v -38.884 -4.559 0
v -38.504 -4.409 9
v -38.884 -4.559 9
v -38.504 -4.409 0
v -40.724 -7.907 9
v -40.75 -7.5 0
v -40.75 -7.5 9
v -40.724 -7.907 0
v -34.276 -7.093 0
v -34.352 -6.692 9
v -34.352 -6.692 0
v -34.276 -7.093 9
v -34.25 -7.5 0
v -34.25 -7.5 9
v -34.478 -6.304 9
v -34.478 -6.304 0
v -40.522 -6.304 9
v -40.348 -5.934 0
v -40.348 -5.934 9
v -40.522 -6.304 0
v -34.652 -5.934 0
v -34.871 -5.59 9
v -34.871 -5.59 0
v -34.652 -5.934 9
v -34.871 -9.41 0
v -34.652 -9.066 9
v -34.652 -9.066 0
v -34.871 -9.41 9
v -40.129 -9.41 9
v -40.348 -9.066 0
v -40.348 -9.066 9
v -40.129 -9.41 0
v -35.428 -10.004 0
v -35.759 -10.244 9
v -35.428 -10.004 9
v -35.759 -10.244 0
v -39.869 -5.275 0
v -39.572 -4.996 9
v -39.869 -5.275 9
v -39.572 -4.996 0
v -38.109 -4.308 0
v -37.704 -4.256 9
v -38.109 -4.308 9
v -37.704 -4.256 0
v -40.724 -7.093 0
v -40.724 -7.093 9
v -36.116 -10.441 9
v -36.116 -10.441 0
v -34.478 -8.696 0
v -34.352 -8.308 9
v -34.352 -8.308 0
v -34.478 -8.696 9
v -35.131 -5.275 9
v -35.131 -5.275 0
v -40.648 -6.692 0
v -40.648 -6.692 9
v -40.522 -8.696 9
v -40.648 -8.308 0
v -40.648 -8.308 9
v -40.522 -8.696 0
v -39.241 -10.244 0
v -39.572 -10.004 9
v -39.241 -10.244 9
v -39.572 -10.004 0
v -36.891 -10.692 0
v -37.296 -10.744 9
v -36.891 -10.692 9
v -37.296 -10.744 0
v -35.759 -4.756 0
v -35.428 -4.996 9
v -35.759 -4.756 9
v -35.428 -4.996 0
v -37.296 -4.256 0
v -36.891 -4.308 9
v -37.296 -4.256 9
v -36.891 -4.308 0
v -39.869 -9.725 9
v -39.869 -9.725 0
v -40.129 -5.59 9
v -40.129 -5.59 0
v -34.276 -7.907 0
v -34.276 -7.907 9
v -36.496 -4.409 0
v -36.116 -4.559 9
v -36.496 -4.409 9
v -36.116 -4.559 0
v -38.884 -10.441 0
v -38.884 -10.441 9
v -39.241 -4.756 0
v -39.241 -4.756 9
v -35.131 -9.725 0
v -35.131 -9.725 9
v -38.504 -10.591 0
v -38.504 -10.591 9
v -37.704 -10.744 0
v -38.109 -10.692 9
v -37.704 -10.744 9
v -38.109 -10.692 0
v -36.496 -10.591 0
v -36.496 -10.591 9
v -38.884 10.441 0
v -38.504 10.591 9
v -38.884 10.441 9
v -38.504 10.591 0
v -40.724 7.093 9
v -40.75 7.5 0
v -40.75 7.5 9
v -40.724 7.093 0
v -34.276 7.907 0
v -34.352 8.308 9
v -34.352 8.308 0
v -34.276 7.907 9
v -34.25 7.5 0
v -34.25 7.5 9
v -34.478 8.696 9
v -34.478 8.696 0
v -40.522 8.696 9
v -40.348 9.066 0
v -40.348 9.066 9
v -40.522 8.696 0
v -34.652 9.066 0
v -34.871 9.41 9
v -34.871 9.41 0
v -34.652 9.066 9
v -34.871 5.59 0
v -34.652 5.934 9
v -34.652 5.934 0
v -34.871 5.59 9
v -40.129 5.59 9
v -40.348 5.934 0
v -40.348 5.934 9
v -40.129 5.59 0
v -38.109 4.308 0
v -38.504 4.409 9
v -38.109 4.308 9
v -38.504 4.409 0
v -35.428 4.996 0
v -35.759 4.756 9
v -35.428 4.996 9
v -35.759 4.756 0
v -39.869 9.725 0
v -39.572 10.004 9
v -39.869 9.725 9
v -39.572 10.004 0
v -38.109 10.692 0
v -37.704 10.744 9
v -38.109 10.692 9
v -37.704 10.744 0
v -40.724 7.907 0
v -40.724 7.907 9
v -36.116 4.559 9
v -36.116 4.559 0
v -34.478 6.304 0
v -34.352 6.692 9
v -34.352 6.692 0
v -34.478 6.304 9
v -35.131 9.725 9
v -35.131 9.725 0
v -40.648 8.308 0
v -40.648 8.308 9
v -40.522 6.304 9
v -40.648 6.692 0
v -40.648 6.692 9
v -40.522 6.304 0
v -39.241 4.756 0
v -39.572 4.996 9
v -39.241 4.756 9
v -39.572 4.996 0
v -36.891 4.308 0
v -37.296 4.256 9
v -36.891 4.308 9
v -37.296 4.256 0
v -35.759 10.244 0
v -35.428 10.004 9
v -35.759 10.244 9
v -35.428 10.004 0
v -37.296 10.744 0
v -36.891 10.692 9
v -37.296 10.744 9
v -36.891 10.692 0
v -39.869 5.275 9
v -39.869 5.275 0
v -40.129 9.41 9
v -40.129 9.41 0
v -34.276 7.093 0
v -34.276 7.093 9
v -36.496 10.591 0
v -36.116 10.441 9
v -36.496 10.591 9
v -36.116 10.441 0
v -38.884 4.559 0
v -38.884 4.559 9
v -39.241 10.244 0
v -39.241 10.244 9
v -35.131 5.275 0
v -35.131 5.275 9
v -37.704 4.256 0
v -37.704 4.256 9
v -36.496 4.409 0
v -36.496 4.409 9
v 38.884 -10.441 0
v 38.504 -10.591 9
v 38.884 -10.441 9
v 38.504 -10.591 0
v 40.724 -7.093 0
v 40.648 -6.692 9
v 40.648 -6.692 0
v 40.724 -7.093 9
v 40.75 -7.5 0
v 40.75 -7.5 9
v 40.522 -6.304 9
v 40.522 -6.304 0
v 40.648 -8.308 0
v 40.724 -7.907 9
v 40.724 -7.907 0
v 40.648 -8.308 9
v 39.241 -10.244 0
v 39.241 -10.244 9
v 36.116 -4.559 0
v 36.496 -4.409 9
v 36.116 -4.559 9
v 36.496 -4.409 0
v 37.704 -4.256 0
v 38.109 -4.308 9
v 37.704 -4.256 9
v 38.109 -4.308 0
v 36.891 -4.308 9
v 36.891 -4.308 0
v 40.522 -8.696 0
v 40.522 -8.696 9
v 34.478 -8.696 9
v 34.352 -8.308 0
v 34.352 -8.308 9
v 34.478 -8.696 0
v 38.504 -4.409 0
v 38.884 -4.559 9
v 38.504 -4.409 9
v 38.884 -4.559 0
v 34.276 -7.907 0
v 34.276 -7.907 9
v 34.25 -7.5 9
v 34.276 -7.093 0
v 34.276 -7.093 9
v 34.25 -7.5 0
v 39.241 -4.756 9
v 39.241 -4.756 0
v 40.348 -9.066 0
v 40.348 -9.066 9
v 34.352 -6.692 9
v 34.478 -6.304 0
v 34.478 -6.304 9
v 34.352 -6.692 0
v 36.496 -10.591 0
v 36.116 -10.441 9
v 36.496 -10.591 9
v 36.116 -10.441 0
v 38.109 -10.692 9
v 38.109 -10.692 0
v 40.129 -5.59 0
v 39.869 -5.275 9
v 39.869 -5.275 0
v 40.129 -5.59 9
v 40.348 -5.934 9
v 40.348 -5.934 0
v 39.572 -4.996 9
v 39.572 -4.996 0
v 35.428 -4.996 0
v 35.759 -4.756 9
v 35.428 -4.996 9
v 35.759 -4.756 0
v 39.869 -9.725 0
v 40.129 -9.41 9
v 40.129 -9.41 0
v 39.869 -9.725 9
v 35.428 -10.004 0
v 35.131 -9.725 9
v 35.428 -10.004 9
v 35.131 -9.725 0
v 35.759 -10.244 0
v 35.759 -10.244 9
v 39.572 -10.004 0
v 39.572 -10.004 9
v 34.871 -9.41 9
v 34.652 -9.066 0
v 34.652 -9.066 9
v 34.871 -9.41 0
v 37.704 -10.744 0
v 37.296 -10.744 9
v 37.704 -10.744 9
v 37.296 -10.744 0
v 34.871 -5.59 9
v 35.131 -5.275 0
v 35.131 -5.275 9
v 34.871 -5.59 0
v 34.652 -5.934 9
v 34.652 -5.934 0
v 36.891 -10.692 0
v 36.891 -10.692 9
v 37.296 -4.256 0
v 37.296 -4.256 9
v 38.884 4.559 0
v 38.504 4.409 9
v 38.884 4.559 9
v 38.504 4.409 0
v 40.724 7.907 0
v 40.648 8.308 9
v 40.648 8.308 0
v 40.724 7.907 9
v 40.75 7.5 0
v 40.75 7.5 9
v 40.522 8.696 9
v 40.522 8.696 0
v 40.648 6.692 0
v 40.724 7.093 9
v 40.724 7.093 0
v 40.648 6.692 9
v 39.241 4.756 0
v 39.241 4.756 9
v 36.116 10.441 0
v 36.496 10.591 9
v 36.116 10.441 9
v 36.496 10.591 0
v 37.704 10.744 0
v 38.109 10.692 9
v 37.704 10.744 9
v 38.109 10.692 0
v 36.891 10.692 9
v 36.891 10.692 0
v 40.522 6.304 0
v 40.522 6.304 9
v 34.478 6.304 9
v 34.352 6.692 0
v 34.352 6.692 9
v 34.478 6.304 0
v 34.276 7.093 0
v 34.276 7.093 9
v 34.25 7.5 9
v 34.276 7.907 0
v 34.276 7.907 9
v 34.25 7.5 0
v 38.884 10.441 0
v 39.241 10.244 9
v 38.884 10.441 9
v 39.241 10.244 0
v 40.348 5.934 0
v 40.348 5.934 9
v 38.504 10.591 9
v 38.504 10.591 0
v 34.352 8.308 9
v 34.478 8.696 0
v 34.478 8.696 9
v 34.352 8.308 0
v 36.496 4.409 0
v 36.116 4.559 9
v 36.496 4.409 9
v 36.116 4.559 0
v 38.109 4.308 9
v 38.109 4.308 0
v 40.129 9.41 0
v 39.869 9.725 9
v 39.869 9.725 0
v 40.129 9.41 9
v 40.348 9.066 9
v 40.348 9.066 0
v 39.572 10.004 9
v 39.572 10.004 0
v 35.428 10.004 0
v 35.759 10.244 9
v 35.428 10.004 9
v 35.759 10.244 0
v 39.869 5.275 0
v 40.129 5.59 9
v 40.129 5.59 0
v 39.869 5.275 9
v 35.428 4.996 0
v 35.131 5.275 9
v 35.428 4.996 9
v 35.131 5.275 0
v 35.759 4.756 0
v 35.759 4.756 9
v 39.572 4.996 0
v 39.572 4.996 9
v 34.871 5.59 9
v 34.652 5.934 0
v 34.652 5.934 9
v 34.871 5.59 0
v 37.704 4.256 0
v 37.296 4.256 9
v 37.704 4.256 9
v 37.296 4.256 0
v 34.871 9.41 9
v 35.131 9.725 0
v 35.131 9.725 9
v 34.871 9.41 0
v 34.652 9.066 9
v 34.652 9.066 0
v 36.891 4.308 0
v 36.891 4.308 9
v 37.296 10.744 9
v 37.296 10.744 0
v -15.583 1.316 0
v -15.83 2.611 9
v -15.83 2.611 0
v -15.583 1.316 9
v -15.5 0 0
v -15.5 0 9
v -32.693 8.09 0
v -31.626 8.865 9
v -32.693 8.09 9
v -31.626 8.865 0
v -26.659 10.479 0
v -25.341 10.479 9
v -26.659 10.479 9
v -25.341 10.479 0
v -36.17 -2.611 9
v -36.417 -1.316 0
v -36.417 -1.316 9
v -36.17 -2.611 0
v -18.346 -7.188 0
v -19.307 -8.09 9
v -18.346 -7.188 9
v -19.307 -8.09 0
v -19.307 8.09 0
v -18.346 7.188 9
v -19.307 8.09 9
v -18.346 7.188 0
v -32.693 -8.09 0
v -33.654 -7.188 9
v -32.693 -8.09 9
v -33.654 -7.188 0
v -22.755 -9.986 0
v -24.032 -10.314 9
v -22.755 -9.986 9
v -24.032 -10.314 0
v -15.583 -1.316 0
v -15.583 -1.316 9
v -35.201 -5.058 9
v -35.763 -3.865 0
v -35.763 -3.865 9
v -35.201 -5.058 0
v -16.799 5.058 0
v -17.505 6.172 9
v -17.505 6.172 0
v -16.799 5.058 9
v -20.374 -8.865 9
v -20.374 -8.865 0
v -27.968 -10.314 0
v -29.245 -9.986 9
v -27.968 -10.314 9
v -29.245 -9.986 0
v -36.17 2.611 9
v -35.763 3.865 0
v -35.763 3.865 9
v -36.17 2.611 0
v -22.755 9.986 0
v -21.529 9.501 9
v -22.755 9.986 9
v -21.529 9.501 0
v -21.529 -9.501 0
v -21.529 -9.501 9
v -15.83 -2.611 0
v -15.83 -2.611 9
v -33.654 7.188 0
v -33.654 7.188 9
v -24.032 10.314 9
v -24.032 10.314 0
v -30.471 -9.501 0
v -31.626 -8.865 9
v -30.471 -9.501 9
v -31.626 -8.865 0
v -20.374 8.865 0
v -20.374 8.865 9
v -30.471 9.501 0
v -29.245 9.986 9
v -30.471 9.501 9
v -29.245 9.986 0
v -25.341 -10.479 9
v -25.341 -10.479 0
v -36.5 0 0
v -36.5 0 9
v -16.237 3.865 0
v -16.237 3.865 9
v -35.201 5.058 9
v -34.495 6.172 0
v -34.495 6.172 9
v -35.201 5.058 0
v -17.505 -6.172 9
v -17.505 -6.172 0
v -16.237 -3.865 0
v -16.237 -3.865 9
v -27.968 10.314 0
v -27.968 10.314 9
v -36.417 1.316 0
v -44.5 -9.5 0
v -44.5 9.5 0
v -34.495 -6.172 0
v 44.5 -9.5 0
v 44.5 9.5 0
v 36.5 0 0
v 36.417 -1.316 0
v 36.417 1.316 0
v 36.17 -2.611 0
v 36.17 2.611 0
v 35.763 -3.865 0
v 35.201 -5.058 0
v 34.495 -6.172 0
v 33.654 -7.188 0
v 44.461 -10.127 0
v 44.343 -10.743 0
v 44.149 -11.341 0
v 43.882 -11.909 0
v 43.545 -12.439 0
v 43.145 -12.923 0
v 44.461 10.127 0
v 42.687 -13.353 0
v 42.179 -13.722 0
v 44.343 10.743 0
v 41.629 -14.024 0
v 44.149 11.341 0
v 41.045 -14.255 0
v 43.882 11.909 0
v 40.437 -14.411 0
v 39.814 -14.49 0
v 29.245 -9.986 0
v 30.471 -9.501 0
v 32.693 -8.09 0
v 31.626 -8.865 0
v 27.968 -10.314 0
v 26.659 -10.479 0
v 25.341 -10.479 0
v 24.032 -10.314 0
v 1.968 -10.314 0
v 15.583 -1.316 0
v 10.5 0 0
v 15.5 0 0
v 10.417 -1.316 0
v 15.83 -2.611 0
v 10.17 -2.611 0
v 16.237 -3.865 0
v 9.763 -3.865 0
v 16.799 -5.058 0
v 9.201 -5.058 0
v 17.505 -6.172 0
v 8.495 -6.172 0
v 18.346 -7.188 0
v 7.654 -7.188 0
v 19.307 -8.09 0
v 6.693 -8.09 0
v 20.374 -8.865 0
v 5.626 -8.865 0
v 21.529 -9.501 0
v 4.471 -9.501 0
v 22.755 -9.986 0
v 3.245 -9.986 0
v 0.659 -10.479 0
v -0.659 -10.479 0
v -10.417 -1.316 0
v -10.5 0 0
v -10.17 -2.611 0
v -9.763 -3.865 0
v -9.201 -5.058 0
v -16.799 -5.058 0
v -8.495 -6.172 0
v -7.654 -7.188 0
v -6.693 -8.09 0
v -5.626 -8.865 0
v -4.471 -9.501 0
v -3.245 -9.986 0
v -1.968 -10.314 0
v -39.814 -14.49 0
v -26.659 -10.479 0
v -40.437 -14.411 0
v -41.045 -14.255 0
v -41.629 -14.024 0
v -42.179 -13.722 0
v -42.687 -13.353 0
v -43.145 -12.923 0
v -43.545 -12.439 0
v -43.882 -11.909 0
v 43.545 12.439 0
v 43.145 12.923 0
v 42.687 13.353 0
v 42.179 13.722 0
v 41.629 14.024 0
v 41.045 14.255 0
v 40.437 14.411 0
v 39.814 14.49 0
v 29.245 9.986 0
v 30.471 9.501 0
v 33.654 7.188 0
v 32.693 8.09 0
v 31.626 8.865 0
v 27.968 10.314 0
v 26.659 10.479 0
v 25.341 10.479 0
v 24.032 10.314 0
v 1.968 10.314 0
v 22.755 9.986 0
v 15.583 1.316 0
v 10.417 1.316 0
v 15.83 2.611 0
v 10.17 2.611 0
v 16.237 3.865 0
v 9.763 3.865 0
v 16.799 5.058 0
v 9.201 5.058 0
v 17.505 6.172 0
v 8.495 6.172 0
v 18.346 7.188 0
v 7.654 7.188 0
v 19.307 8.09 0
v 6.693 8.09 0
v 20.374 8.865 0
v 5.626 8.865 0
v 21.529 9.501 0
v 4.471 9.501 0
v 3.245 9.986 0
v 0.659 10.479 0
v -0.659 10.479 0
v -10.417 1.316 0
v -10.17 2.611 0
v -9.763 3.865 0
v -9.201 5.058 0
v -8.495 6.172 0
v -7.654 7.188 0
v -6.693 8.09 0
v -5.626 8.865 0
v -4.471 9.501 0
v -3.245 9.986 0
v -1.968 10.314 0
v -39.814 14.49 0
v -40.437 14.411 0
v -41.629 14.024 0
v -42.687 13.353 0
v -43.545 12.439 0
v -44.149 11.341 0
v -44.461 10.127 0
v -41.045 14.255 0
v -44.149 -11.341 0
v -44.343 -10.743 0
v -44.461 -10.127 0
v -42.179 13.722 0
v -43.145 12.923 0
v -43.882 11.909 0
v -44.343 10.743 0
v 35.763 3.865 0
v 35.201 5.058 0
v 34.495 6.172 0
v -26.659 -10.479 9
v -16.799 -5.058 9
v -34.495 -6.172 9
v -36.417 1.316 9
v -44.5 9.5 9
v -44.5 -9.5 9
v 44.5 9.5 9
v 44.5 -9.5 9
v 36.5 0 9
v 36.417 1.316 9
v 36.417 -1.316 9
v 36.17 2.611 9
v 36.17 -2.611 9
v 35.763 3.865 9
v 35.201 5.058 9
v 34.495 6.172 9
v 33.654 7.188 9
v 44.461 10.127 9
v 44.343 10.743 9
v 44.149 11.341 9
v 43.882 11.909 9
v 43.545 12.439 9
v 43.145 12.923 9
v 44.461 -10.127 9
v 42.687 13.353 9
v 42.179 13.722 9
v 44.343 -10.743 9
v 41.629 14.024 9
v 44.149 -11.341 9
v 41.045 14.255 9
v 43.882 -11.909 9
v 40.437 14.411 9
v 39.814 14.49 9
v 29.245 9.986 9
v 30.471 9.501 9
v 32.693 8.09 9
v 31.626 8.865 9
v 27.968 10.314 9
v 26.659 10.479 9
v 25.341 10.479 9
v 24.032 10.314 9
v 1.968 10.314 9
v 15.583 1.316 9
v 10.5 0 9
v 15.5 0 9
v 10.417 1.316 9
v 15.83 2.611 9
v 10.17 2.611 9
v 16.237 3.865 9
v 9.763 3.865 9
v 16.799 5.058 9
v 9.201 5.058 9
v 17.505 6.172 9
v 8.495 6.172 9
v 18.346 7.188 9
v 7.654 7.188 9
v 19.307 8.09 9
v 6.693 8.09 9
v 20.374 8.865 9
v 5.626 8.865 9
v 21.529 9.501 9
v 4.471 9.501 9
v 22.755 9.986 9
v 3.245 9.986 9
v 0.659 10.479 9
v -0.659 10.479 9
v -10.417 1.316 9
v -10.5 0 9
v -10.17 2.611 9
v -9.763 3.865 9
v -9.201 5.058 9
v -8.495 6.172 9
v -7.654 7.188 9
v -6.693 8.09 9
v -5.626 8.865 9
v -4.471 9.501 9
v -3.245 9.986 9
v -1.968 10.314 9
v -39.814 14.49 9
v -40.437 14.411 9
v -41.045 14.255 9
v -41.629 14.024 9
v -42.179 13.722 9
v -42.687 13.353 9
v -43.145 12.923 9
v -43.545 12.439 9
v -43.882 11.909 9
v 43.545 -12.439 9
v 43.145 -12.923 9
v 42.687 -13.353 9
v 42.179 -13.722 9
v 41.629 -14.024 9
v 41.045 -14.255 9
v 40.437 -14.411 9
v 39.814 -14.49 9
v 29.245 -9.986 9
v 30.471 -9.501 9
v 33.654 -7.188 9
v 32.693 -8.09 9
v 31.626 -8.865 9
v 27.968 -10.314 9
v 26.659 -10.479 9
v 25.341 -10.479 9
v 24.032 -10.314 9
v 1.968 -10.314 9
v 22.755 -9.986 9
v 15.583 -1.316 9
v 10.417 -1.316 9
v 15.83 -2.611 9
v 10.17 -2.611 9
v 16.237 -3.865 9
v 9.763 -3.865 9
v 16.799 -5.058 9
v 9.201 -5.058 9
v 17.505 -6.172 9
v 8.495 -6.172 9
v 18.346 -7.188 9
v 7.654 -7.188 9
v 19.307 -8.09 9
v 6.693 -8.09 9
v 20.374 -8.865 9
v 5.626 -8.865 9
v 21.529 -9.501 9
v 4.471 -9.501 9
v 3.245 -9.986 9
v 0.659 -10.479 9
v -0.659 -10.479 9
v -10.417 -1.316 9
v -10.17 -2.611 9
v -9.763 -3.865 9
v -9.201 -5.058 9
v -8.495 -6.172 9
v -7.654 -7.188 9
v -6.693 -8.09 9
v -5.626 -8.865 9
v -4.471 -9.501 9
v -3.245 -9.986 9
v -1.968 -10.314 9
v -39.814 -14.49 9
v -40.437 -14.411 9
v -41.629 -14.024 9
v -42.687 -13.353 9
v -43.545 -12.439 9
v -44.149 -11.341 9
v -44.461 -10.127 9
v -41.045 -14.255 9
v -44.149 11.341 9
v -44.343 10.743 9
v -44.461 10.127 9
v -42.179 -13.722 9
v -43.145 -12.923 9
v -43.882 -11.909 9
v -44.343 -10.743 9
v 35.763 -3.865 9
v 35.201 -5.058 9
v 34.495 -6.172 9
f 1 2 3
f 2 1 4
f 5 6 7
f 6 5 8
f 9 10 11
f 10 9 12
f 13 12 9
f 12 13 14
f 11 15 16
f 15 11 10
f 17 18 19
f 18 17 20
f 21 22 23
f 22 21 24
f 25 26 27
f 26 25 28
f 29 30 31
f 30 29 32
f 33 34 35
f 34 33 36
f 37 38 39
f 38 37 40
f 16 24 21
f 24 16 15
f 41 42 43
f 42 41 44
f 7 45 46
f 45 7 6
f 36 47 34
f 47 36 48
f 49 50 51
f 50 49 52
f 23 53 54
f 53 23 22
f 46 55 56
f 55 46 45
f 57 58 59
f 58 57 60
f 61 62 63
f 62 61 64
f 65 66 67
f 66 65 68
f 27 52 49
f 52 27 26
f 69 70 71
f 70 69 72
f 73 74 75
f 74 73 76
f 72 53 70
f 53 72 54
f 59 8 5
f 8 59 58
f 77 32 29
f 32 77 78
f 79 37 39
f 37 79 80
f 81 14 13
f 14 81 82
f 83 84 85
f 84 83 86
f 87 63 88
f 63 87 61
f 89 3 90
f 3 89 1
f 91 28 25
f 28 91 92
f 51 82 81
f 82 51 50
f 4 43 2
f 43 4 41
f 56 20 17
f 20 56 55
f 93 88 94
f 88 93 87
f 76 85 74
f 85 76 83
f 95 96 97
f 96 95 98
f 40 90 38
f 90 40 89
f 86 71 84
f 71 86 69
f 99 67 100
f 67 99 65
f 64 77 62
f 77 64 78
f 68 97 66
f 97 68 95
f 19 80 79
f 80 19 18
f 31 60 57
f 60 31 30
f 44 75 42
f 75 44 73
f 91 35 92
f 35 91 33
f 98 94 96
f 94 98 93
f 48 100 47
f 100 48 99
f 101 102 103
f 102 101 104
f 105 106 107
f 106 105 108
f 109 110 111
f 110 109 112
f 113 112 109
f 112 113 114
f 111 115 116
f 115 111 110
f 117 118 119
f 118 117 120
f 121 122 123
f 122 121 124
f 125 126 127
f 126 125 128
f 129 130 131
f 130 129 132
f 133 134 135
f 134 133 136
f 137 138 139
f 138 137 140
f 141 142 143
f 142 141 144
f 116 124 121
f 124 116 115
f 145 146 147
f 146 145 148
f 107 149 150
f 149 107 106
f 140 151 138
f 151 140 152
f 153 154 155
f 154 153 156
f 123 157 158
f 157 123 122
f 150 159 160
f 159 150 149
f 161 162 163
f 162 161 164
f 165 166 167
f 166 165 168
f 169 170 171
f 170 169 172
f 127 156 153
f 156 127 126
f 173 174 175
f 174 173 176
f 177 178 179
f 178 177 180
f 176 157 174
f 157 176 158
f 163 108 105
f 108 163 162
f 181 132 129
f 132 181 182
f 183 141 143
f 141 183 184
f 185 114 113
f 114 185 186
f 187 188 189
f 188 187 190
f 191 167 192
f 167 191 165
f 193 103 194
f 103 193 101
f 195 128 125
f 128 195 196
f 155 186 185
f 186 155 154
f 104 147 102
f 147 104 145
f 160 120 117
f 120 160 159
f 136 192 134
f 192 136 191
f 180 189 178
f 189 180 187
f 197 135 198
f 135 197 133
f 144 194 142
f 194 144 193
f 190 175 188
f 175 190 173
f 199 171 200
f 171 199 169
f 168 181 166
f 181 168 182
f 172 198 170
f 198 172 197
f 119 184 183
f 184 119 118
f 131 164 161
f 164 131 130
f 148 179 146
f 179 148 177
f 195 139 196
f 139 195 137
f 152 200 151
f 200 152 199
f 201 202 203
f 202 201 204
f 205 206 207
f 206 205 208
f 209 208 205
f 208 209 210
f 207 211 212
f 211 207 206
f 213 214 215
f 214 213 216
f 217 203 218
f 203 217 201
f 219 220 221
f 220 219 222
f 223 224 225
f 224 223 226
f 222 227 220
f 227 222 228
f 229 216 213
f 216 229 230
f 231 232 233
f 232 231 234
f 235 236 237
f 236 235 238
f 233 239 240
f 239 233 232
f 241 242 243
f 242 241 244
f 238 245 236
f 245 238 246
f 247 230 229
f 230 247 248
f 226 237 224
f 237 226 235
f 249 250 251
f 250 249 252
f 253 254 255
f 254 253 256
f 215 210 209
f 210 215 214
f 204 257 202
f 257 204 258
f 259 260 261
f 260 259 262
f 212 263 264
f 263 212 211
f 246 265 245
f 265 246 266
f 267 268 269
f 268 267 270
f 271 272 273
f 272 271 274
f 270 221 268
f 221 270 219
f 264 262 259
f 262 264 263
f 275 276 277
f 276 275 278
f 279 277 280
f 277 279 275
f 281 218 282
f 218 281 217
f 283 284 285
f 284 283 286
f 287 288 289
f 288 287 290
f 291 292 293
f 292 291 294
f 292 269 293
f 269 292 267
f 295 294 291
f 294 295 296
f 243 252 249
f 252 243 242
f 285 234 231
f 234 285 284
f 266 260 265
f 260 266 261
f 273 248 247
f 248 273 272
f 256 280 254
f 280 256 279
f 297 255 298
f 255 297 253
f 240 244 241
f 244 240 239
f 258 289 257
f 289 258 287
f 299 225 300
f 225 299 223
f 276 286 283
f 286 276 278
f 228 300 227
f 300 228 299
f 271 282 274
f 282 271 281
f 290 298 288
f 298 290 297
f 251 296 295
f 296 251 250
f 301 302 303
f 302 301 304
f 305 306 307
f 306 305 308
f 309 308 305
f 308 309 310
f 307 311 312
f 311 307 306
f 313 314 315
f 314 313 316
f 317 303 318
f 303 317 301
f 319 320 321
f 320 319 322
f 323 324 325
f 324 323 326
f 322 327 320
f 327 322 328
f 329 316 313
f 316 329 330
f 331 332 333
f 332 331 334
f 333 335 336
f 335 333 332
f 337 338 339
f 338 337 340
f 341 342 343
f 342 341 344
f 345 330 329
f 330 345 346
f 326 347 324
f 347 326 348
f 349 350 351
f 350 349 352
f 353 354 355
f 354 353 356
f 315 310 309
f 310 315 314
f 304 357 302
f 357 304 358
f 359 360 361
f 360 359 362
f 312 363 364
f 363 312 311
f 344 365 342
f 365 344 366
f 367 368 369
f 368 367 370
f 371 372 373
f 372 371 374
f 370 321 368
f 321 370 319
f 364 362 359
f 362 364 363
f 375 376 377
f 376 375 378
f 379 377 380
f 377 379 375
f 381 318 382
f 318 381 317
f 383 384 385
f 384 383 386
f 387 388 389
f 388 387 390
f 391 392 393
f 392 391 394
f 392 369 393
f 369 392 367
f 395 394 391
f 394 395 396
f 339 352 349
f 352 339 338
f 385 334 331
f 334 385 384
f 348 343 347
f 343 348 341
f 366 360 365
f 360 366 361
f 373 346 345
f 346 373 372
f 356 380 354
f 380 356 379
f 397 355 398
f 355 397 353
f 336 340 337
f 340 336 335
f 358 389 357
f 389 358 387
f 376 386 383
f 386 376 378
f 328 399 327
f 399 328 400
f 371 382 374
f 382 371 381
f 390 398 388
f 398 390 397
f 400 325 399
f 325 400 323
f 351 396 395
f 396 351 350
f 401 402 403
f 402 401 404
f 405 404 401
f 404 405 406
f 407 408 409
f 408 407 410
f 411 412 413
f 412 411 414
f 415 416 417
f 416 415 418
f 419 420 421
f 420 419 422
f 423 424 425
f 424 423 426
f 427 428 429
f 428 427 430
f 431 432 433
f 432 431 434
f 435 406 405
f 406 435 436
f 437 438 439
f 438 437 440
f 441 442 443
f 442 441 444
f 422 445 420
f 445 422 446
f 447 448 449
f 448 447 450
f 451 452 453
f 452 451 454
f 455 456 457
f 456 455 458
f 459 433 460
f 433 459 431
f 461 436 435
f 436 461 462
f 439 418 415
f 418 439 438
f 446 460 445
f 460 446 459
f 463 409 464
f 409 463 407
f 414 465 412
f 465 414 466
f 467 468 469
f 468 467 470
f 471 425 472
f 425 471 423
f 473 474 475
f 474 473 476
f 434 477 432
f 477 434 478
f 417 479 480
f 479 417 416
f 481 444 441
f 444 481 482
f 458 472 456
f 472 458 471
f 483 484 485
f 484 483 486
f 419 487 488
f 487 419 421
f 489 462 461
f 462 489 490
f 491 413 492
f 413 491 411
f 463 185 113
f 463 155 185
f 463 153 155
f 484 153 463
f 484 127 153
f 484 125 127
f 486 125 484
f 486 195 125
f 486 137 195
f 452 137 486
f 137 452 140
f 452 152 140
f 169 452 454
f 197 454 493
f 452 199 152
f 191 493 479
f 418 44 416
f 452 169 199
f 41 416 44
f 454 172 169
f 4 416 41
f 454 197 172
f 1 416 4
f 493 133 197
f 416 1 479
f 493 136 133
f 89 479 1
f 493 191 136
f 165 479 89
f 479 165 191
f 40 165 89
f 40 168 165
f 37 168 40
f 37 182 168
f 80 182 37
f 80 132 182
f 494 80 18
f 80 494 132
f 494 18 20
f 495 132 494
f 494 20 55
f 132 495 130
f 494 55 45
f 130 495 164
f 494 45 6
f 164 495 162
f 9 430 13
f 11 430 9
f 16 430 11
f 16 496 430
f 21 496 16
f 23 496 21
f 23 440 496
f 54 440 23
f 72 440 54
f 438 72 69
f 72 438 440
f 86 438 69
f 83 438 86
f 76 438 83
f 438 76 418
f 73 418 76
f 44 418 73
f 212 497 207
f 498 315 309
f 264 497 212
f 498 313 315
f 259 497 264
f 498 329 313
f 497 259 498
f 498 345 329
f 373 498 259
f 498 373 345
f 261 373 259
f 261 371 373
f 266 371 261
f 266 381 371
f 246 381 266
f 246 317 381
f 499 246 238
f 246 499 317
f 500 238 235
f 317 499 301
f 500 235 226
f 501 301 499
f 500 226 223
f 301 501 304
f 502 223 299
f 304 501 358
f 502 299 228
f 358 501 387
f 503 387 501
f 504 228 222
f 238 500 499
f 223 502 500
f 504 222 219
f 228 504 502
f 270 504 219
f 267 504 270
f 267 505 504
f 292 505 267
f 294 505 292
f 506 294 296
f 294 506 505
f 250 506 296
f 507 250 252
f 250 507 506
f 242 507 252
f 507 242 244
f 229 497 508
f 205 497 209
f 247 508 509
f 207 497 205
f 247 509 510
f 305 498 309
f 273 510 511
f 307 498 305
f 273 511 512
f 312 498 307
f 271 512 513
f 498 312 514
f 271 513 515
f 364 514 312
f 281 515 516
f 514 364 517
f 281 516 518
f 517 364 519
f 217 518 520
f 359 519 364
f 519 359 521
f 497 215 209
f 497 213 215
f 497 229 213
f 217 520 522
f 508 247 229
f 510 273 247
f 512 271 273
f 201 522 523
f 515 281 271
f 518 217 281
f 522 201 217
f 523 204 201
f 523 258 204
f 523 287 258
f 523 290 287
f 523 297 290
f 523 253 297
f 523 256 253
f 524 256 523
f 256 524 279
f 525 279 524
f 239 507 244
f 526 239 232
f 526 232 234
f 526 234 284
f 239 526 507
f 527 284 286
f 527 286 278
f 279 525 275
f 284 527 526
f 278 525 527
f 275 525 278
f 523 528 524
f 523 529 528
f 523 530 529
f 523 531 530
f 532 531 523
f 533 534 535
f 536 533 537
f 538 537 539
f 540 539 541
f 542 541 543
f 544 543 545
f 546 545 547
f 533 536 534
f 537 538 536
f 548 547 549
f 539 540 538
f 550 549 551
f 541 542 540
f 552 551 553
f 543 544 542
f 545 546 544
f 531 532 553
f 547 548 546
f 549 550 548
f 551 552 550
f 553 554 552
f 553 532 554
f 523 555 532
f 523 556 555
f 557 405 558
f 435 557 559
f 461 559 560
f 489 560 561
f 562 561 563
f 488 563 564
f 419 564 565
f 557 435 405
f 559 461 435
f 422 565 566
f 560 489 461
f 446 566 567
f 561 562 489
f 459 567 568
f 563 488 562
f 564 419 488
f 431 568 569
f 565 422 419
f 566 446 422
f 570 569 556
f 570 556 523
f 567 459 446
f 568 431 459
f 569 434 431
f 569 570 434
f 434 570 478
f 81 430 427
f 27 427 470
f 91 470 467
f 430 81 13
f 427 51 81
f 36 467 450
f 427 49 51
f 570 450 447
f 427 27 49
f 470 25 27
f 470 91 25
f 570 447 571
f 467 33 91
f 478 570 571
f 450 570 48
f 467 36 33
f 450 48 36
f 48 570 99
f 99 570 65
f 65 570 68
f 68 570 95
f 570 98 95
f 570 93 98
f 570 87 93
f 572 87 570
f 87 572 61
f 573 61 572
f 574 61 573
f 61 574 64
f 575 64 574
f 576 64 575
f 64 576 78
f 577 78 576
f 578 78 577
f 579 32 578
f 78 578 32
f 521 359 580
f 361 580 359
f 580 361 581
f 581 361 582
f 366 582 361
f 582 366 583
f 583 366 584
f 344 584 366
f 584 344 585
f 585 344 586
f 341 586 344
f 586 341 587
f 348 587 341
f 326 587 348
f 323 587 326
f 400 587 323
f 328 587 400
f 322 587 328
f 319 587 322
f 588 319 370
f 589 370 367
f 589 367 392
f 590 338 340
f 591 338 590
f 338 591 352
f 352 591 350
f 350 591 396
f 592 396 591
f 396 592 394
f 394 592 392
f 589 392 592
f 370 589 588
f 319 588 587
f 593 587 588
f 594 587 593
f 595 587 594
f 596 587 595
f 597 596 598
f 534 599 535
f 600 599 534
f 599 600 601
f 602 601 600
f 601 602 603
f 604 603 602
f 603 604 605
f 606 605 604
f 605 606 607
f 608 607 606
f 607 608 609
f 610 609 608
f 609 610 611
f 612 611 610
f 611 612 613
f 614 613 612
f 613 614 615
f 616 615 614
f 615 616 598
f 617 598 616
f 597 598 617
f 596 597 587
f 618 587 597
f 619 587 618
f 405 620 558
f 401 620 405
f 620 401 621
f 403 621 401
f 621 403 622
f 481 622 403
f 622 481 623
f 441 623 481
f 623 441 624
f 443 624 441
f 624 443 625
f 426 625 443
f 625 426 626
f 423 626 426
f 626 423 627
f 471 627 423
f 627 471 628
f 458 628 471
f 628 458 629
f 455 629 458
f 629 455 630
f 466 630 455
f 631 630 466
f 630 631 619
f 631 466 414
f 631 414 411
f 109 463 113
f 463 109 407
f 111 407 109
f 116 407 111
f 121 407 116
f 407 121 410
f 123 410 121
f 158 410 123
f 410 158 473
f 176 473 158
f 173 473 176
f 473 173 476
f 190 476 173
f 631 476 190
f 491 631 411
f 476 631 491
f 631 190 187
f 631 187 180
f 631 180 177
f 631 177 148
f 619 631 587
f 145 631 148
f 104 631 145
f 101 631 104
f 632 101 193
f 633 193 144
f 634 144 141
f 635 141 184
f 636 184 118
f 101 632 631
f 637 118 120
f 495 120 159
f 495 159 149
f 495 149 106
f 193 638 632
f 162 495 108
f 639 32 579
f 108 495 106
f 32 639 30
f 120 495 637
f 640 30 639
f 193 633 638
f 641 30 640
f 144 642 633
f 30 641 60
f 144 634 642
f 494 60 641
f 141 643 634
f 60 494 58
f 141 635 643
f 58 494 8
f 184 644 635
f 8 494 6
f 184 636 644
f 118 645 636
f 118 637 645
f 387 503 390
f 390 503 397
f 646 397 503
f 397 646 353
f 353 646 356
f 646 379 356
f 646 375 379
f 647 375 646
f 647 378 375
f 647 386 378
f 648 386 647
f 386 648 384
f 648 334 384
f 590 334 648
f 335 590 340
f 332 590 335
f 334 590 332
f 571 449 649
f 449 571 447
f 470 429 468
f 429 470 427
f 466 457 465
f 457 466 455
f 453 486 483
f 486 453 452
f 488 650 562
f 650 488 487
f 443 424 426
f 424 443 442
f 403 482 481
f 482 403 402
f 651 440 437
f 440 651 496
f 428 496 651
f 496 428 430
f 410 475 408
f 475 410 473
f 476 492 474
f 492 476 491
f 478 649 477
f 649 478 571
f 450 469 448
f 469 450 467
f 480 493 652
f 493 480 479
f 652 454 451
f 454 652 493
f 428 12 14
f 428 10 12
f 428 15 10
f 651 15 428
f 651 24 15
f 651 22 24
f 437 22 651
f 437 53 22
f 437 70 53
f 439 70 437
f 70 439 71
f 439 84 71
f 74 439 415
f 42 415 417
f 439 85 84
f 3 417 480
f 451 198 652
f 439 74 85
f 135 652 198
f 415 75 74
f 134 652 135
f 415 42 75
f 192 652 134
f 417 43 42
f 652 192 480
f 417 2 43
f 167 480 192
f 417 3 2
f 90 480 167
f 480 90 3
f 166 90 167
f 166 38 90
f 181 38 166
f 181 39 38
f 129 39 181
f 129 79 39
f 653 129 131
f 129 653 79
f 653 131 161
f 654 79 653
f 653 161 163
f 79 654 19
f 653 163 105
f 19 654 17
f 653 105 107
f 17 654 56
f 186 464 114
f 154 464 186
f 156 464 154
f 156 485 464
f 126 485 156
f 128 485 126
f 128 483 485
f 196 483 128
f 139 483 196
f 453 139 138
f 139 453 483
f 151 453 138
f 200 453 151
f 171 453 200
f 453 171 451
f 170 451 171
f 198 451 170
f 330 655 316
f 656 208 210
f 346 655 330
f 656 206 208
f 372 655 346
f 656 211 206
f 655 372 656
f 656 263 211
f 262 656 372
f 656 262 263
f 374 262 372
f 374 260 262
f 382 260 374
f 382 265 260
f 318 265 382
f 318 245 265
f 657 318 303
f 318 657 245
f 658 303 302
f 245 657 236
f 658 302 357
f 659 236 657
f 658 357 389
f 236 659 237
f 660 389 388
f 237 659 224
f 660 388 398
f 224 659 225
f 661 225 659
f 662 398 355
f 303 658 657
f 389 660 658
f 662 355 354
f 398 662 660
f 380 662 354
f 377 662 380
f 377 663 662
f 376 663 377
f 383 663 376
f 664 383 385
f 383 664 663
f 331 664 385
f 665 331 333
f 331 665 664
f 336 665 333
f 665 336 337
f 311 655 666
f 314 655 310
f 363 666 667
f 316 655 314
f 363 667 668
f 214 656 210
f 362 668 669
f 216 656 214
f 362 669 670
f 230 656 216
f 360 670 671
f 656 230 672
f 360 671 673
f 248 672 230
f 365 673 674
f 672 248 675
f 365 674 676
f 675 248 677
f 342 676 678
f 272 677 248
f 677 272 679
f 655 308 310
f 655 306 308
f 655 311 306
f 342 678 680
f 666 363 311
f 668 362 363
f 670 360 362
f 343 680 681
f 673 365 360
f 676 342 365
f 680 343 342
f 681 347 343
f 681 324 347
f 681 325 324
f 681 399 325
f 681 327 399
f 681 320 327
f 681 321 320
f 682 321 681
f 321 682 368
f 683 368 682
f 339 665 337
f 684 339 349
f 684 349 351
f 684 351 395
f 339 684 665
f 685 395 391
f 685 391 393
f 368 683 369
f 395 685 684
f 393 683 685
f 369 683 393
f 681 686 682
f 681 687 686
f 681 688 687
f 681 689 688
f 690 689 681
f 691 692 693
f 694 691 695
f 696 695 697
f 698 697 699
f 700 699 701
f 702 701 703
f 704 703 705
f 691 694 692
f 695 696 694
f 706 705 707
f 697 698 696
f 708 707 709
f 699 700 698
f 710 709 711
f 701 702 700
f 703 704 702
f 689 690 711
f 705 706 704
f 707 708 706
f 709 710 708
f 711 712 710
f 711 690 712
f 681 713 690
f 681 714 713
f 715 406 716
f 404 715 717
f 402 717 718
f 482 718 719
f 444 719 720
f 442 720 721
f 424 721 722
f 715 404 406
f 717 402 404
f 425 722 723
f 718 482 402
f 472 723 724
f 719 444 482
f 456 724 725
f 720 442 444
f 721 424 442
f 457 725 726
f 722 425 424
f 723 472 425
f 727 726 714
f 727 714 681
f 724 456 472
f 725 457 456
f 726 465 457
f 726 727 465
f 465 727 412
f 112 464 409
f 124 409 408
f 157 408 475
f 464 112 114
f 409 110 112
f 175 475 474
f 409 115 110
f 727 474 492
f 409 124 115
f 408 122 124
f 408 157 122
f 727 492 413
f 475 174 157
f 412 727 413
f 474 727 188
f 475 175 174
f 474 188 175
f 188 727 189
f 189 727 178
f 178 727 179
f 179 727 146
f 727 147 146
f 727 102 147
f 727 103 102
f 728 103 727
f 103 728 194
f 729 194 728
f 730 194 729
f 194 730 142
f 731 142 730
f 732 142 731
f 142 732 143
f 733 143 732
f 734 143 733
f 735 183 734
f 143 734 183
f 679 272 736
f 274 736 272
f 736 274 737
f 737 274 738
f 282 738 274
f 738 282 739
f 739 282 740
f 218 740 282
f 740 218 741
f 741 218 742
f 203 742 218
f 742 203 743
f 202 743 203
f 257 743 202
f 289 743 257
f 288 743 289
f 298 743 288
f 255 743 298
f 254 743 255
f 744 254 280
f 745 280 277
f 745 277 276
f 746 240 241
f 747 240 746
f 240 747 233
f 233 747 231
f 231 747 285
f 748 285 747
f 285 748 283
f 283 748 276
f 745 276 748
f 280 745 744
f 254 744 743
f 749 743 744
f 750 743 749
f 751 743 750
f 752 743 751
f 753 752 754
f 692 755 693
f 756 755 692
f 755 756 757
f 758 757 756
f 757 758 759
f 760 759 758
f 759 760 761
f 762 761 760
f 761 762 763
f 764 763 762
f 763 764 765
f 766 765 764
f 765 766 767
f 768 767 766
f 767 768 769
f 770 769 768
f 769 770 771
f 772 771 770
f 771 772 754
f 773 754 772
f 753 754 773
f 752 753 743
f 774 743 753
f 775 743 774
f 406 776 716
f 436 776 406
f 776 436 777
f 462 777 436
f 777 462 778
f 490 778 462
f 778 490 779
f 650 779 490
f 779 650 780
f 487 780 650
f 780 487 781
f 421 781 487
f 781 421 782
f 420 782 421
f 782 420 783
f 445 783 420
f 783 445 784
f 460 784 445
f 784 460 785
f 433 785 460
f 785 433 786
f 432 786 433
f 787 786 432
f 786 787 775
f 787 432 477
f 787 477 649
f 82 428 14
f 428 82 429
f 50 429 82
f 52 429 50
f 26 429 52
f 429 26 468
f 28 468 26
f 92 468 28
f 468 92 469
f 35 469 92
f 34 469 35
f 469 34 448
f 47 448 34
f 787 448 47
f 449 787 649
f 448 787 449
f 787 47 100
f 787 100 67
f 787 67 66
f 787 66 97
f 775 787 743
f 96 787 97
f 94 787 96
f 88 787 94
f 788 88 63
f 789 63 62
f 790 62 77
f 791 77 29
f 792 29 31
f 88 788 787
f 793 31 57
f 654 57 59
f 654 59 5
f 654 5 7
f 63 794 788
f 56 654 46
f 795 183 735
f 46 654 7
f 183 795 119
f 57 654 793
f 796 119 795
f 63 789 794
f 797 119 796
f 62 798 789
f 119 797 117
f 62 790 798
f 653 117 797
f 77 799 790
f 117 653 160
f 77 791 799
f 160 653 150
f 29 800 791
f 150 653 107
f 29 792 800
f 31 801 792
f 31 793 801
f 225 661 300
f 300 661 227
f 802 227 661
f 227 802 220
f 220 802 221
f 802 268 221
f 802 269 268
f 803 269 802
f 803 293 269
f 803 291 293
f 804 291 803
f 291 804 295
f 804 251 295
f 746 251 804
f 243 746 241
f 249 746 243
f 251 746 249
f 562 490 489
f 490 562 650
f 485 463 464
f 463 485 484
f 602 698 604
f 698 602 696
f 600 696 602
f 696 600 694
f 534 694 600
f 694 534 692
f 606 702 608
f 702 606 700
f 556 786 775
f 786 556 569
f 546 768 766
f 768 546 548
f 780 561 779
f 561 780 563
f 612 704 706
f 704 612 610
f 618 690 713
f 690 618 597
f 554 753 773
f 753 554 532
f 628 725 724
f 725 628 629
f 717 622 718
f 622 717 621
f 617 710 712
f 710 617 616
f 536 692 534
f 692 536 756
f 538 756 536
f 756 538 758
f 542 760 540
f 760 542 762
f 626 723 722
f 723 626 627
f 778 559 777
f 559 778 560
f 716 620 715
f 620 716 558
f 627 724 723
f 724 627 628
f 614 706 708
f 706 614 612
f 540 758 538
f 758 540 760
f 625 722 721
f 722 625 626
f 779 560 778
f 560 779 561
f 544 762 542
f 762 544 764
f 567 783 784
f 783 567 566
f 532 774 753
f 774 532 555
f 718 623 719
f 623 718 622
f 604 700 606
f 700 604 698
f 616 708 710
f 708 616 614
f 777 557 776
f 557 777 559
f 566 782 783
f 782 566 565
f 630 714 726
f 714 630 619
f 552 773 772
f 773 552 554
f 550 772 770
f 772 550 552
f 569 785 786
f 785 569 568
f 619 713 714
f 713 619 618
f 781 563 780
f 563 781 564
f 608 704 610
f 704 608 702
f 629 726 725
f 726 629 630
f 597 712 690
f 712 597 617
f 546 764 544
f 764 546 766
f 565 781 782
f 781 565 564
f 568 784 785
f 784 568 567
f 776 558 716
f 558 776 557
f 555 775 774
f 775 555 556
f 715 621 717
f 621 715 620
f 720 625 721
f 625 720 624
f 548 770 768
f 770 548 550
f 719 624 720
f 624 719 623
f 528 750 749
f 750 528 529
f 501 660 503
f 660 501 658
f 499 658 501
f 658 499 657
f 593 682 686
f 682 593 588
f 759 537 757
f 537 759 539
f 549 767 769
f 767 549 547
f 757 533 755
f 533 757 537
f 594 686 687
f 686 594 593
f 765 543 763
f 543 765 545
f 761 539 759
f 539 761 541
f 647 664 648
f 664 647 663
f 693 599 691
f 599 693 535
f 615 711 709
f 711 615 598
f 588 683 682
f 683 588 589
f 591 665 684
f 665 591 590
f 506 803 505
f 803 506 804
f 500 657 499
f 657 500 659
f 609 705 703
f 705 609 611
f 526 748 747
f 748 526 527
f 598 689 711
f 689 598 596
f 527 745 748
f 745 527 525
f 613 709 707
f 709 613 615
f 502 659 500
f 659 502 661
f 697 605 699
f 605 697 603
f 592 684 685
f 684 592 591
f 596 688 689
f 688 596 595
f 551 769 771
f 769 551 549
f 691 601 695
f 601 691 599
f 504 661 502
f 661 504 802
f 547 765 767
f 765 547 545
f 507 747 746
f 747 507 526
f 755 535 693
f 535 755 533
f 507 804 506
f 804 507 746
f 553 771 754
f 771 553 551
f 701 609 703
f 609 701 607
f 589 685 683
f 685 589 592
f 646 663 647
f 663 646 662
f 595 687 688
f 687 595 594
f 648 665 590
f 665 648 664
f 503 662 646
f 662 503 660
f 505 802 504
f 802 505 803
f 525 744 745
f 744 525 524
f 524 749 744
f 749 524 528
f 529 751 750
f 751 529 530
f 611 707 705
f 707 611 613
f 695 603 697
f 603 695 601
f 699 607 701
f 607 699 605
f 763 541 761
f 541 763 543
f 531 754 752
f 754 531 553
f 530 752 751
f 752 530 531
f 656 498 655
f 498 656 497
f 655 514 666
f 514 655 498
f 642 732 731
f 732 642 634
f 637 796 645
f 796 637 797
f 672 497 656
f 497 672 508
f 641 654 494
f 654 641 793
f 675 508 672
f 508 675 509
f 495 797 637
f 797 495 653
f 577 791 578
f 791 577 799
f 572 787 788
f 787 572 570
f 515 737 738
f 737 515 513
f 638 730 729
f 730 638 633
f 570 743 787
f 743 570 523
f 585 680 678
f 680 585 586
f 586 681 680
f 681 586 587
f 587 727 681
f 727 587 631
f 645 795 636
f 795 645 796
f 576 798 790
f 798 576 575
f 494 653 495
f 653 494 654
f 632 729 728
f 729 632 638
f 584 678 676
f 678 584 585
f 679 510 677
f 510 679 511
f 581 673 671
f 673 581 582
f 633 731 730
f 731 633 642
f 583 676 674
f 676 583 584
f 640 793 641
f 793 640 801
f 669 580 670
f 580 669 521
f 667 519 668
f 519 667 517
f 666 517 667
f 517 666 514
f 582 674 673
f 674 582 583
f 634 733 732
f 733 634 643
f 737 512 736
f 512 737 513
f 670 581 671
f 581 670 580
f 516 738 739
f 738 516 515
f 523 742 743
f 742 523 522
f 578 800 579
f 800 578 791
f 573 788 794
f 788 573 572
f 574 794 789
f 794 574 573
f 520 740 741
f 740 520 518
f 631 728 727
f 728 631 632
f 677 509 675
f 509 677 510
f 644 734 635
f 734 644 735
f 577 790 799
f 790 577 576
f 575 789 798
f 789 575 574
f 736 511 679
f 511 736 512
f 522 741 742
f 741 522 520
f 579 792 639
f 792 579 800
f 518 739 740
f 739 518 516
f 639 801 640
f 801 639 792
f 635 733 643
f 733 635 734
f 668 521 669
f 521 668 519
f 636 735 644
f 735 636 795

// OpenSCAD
$fn = 50;


difference() {
	union() {
		hull() {
			translate(v = [-39.5000000000, 9.5000000000, 0]) {
				cylinder(h = 9, r = 5);
			}
			translate(v = [39.5000000000, 9.5000000000, 0]) {
				cylinder(h = 9, r = 5);
			}
			translate(v = [-39.5000000000, -9.5000000000, 0]) {
				cylinder(h = 9, r = 5);
			}
			translate(v = [39.5000000000, -9.5000000000, 0]) {
				cylinder(h = 9, r = 5);
			}
		}
	}
	union() {
		#translate(v = [-37.5000000000, -7.5000000000, -100.0000000000]) {
			cylinder(h = 200, r = 3.2500000000);
		}
		#translate(v = [-37.5000000000, 7.5000000000, -100.0000000000]) {
			cylinder(h = 200, r = 3.2500000000);
		}
		#translate(v = [37.5000000000, -7.5000000000, -100.0000000000]) {
			cylinder(h = 200, r = 3.2500000000);
		}
		#translate(v = [37.5000000000, 7.5000000000, -100.0000000000]) {
			cylinder(h = 200, r = 3.2500000000);
		}
		#translate(v = [-26.0000000000, 0, 0]) {
			cylinder(h = 9, r = 10.5000000000);
		}
		#cylinder(h = 9, r = 10.5000000000);
		#translate(v = [26.0000000000, 0, 0]) {
			cylinder(h = 9, r = 10.5000000000);
		}
	}
}
